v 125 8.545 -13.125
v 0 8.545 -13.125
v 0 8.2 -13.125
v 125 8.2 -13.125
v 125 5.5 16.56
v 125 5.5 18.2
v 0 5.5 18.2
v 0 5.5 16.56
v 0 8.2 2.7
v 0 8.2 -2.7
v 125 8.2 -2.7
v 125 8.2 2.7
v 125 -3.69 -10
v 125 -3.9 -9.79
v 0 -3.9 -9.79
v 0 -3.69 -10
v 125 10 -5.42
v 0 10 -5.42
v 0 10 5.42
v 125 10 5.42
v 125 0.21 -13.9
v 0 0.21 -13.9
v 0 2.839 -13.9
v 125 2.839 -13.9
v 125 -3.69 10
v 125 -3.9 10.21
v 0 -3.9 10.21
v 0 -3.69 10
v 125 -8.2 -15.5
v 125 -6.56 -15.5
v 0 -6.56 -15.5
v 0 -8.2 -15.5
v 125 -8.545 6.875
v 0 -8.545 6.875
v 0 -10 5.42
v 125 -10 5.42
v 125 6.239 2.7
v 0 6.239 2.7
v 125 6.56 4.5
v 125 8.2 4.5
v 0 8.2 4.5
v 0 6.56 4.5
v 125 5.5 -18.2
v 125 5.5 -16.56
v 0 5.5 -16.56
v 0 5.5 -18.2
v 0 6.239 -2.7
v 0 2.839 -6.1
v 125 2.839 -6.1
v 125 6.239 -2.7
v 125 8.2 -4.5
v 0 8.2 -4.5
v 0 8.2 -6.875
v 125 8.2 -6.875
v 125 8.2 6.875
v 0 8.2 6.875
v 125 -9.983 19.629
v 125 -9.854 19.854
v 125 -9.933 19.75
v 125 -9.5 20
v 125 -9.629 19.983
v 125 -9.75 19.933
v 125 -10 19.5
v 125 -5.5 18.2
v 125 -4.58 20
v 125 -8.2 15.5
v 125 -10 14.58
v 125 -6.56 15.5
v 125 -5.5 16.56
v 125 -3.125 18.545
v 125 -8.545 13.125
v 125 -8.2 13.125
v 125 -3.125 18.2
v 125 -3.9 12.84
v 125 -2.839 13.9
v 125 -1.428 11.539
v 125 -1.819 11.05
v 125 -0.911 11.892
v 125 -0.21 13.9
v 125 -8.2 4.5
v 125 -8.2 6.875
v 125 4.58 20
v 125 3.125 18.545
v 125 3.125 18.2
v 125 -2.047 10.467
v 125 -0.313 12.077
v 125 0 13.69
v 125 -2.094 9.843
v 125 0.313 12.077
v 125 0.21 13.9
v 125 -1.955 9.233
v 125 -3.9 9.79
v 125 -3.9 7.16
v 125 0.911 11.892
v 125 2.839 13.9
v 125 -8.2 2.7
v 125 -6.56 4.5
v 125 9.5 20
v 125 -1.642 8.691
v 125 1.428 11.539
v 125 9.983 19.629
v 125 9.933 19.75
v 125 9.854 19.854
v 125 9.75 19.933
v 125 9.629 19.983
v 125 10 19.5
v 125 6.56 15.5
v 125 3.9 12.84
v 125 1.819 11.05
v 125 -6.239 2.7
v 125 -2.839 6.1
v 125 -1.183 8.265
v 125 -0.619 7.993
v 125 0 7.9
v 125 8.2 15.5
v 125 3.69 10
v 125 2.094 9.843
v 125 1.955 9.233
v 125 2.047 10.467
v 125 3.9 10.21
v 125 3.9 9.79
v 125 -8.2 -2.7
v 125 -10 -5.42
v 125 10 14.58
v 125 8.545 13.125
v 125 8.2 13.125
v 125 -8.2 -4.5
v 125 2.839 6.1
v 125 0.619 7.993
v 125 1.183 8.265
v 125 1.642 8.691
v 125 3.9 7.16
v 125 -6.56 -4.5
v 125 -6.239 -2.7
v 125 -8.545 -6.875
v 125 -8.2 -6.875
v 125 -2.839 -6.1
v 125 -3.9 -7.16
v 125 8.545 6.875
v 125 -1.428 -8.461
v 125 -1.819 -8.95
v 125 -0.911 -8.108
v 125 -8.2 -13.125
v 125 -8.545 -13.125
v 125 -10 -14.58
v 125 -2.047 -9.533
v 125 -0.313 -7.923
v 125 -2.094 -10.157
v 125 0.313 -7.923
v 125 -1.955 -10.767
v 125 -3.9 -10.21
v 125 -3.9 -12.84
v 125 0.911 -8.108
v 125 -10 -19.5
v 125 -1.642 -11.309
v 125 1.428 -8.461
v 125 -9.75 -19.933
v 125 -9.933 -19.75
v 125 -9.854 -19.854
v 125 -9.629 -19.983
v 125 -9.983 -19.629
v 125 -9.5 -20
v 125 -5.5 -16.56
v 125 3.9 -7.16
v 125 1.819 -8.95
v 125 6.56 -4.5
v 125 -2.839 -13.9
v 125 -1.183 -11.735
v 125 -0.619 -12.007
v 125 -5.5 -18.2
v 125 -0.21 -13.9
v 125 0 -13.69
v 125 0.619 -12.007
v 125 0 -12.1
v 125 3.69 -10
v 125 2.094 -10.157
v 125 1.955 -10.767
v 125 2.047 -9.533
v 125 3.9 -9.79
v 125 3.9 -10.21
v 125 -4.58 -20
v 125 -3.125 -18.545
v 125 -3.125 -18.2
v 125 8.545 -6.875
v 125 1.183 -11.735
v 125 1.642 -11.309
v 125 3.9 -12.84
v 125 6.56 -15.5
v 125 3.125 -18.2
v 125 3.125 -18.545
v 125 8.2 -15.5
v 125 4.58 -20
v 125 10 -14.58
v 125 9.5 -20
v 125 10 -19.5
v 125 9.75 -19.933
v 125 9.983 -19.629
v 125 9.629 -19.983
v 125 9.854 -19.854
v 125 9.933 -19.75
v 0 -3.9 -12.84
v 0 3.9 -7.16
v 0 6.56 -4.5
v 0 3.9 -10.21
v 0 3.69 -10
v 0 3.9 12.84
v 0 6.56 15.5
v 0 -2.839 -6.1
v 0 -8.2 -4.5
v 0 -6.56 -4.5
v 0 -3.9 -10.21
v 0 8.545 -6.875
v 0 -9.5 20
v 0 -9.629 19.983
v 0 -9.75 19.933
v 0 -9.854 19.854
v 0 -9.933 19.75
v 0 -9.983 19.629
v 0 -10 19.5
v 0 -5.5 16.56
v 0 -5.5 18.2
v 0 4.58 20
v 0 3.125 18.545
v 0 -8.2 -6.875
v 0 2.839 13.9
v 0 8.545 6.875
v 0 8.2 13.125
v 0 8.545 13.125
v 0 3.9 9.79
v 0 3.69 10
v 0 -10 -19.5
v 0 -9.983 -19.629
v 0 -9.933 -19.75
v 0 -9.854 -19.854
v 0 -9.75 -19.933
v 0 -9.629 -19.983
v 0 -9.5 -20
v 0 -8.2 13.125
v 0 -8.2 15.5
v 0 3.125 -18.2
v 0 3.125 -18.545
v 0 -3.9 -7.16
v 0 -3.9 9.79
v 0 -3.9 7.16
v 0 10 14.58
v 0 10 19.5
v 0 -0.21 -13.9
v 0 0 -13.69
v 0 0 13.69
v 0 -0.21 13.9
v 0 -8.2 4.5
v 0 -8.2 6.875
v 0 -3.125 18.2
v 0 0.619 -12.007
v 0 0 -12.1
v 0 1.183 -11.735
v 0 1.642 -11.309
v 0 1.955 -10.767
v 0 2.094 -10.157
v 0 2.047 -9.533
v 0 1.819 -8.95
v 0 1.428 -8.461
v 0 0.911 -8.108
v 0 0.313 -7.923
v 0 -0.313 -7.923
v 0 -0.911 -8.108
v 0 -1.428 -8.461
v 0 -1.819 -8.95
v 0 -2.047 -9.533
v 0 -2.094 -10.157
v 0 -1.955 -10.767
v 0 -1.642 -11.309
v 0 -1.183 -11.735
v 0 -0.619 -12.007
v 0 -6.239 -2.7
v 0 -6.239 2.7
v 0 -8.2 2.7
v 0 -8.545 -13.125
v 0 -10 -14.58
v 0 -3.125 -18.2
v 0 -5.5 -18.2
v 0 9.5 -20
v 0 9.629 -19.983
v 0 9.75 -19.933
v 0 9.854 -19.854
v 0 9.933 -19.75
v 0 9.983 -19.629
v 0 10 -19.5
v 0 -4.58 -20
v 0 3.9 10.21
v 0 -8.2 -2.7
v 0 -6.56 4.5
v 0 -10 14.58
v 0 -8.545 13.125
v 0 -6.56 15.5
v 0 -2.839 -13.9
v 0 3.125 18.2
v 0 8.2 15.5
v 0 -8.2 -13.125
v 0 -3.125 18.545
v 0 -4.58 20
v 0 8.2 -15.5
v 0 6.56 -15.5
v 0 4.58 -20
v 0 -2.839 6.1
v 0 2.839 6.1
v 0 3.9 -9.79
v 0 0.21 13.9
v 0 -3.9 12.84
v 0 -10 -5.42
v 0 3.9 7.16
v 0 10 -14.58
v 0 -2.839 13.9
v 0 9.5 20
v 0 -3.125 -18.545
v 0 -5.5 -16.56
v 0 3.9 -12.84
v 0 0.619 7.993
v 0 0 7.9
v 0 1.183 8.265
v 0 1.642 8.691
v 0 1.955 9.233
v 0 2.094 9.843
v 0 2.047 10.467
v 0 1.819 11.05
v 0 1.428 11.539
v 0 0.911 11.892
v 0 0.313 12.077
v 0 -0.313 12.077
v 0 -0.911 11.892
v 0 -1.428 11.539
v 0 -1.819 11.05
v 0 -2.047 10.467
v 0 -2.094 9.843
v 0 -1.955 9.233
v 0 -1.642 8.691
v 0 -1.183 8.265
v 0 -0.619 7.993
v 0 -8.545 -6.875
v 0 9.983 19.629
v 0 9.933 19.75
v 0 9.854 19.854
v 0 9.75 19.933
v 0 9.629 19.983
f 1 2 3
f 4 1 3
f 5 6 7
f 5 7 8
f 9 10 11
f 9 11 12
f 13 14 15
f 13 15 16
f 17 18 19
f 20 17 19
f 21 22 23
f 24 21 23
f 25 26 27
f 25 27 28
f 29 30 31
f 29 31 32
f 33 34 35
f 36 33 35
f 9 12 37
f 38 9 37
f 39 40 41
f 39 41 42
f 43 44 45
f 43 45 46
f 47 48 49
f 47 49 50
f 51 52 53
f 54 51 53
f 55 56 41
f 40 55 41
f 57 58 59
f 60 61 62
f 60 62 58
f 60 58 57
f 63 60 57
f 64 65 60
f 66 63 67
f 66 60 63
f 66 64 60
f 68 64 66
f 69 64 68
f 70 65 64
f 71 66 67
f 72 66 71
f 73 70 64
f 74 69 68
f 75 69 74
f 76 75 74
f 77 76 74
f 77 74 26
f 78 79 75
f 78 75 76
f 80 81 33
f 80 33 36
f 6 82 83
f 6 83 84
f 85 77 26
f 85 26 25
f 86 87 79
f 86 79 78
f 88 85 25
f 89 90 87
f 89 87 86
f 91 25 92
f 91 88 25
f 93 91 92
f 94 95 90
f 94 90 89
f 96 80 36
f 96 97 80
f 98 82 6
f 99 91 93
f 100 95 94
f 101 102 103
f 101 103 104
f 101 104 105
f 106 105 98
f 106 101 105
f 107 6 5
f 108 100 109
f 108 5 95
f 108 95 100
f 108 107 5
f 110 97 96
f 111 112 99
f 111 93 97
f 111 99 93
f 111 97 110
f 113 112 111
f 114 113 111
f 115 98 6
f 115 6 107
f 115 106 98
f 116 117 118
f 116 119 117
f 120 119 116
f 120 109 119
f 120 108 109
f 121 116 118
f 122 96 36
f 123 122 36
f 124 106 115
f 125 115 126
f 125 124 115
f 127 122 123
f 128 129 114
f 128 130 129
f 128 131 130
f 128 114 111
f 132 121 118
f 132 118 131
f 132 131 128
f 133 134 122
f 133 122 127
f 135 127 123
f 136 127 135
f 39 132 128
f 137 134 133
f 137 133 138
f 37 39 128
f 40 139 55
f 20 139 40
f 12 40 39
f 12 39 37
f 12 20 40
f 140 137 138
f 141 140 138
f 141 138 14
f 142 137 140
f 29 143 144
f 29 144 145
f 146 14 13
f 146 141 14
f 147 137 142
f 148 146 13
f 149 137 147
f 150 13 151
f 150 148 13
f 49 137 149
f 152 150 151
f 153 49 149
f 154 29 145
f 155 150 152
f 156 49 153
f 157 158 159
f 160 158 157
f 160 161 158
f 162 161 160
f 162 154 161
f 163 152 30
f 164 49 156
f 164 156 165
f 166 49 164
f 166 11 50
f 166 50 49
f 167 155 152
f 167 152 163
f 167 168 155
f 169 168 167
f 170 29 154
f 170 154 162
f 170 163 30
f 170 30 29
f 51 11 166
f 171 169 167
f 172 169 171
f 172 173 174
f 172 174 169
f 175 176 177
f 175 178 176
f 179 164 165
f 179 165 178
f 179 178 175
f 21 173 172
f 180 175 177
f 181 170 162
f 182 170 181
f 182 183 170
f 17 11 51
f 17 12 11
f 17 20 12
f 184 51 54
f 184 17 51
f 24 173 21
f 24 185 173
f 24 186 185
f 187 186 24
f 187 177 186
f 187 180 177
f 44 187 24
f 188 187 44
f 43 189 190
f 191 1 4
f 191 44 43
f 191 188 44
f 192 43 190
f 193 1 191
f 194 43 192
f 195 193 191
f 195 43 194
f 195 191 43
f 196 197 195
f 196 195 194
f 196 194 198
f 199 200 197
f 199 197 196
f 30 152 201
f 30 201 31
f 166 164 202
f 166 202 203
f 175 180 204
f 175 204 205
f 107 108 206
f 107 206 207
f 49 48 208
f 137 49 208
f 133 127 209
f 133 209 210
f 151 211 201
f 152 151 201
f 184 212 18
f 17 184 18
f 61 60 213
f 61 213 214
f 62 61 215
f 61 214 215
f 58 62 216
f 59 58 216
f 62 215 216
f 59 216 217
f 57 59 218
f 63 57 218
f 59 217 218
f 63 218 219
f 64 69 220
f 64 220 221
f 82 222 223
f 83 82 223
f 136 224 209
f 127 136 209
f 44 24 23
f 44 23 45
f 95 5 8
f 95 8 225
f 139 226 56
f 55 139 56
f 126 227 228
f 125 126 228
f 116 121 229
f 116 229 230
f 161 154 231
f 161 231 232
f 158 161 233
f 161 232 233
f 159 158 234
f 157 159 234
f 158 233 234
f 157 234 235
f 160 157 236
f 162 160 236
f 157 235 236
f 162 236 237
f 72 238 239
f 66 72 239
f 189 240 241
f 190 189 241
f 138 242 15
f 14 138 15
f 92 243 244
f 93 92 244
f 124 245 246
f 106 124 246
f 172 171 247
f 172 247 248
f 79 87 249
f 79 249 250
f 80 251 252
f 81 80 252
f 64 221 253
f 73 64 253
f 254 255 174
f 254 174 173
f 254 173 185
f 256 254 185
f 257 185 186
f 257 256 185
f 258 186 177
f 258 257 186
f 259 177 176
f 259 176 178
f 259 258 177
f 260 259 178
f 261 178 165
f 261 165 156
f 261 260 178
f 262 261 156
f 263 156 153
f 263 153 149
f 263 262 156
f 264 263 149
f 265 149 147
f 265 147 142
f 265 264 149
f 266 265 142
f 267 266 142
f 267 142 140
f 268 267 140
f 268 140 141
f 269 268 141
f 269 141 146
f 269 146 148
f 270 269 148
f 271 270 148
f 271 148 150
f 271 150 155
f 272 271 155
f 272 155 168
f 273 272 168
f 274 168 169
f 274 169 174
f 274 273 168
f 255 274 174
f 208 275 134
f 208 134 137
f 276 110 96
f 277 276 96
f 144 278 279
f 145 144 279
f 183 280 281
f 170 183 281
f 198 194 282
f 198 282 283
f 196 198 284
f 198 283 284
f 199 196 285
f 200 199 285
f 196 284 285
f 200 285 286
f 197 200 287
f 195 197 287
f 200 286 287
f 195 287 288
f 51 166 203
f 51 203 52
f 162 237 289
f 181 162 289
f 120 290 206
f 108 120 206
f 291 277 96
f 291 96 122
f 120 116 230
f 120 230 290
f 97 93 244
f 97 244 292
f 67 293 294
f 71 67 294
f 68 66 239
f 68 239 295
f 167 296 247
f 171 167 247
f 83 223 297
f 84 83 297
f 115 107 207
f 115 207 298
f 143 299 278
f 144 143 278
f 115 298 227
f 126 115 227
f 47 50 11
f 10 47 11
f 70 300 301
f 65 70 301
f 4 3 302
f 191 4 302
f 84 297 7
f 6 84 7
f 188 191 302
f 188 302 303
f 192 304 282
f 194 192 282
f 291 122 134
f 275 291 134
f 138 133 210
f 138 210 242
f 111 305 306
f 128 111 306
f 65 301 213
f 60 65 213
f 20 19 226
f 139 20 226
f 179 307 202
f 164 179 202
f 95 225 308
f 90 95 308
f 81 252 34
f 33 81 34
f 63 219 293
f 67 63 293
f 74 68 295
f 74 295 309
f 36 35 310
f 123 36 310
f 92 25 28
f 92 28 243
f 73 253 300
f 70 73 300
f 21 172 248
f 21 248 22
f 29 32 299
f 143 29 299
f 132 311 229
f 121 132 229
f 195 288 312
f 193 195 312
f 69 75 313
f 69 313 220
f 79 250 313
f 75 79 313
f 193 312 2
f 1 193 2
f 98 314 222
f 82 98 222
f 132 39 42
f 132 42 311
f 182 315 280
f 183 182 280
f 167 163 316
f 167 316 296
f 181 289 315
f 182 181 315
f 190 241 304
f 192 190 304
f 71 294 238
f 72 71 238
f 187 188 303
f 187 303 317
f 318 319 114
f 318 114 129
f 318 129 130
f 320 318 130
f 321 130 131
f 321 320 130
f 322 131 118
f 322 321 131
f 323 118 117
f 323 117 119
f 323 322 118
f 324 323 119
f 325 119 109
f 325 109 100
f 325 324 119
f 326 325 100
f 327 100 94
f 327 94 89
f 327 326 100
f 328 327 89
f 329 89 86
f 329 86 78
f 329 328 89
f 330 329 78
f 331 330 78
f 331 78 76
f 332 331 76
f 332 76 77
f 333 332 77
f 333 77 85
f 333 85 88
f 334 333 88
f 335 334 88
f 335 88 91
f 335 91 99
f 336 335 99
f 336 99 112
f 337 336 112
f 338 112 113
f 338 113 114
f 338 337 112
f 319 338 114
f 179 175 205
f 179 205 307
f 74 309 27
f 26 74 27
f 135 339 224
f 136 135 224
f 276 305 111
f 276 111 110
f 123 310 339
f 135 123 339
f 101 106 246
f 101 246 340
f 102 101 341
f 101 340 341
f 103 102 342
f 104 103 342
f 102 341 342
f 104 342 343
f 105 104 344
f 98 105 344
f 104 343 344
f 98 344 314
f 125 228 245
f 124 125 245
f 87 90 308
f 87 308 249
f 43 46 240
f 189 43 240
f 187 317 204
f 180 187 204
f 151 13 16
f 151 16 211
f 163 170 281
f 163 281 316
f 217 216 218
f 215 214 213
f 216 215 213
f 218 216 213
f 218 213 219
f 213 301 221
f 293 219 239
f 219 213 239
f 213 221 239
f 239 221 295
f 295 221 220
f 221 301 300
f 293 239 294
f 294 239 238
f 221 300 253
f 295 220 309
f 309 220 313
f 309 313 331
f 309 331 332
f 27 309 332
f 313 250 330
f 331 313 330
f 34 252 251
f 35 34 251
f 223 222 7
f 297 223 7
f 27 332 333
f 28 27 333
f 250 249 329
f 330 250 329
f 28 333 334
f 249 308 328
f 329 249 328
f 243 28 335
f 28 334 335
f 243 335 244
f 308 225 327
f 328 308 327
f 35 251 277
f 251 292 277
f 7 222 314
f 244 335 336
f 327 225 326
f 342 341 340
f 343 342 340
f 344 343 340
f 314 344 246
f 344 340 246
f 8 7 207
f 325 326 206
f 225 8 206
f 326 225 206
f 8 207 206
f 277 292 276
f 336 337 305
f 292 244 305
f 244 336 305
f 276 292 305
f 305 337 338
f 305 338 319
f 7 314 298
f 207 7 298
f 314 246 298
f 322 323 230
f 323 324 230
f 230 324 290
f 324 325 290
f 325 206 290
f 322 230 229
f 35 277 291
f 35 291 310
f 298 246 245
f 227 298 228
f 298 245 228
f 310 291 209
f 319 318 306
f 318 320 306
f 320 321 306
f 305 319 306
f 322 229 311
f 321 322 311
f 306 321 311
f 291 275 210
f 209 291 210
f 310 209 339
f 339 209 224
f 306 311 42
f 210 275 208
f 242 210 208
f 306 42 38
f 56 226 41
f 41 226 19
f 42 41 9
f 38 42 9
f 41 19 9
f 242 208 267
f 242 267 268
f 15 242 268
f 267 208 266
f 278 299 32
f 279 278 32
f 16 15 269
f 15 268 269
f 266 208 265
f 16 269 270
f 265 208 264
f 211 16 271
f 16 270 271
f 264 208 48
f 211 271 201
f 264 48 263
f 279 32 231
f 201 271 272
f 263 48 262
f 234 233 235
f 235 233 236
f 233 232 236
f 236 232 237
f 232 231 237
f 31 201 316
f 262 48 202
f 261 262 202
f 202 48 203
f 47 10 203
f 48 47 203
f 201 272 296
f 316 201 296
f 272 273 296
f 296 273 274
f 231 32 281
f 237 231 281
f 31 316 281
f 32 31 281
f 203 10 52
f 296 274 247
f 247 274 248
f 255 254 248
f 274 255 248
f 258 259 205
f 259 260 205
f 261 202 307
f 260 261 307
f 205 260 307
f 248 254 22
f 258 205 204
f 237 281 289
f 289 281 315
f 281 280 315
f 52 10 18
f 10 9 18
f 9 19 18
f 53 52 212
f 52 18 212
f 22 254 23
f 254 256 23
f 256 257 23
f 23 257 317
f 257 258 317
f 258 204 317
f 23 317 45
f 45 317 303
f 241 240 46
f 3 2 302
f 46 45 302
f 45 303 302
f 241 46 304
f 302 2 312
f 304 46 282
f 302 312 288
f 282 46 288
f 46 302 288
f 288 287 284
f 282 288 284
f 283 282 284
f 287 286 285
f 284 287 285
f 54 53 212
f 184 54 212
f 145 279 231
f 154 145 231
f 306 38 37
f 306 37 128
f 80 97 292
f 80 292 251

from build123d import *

# Parameters (mm, degrees)
PROFILE_SKETCH_R      = 2.1
PROFILE_EXTRUDE_DEPTH = 125


with BuildPart() as part:
    # Profile Sketch → Profile Extrude (new body)
    with BuildSketch(Plane(origin=(0, 0, 0), x_dir=(0, 0, -1), z_dir=(1, 0, 0))):
        with BuildLine():
            Line((5.42, 10), (-5.42, 10))
            Line((-5.42, 10), (-6.875, 8.545))
            Line((-6.875, 8.545), (-6.875, 8.2))
            Line((-6.875, 8.2), (-4.5, 8.2))
            Line((-4.5, 8.2), (-4.5, 6.56))
            Line((-4.5, 6.56), (-7.16, 3.9))
            Line((-7.16, 3.9), (-9.79, 3.9))
            Line((-9.79, 3.9), (-10, 3.69))
            Line((-10, 3.69), (-10.21, 3.9))
            Line((-10.21, 3.9), (-12.84, 3.9))
            Line((-12.84, 3.9), (-15.5, 6.56))
            Line((-15.5, 6.56), (-15.5, 8.2))
            Line((-15.5, 8.2), (-13.125, 8.2))
            Line((-13.125, 8.2), (-13.125, 8.545))
            Line((-13.125, 8.545), (-14.58, 10))
            Line((-14.58, 10), (-19.5, 10))
            ThreePointArc((-19.5, 10), (-19.853553391, 9.853553391), (-20, 9.5))
            Line((-20, 9.5), (-20, 4.58))
            Line((-20, 4.58), (-18.545, 3.125))
            Line((-18.545, 3.125), (-18.2, 3.125))
            Line((-18.2, 3.125), (-18.2, 5.5))
            Line((-18.2, 5.5), (-16.56, 5.5))
            Line((-16.56, 5.5), (-13.9, 2.838679656))
            Line((-13.9, 2.838679656), (-13.9, 0.21))
            Line((-13.9, 0.21), (-13.69, 0))
            Line((-13.69, 0), (-13.9, -0.21))
            Line((-13.9, -0.21), (-13.9, -2.838679656))
            Line((-13.9, -2.838679656), (-16.56, -5.5))
            Line((-16.56, -5.5), (-18.2, -5.5))
            Line((-18.2, -5.5), (-18.2, -3.125))
            Line((-18.2, -3.125), (-18.545, -3.125))
            Line((-18.545, -3.125), (-20, -4.58))
            Line((-20, -4.58), (-20, -9.5))
            ThreePointArc((-20, -9.5), (-19.853553391, -9.853553391), (-19.5, -10))
            Line((-19.5, -10), (-14.58, -10))
            Line((-14.58, -10), (-13.125, -8.545))
            Line((-13.125, -8.545), (-13.125, -8.2))
            Line((-13.125, -8.2), (-15.5, -8.2))
            Line((-15.5, -8.2), (-15.5, -6.56))
            Line((-15.5, -6.56), (-12.84, -3.9))
            Line((-12.84, -3.9), (-10.21, -3.9))
            Line((-10.21, -3.9), (-10, -3.69))
            Line((-10, -3.69), (-9.79, -3.9))
            Line((-9.79, -3.9), (-7.16, -3.9))
            Line((-7.16, -3.9), (-4.5, -6.56))
            Line((-4.5, -6.56), (-4.5, -8.2))
            Line((-4.5, -8.2), (-6.875, -8.2))
            Line((-6.875, -8.2), (-6.875, -8.545))
            Line((-6.875, -8.545), (-5.42, -10))
            Line((-5.42, -10), (5.42, -10))
            Line((5.42, -10), (6.875, -8.545))
            Line((6.875, -8.545), (6.875, -8.2))
            Line((6.875, -8.2), (4.5, -8.2))
            Line((4.5, -8.2), (4.5, -6.56))
            Line((4.5, -6.56), (7.16, -3.9))
            Line((7.16, -3.9), (9.79, -3.9))
            Line((9.79, -3.9), (10, -3.69))
            Line((10, -3.69), (10.21, -3.9))
            Line((10.21, -3.9), (12.84, -3.9))
            Line((12.84, -3.9), (15.5, -6.56))
            Line((15.5, -6.56), (15.5, -8.2))
            Line((15.5, -8.2), (13.125, -8.2))
            Line((13.125, -8.2), (13.125, -8.545))
            Line((13.125, -8.545), (14.58, -10))
            Line((14.58, -10), (19.5, -10))
            ThreePointArc((19.5, -10), (19.853553391, -9.853553391), (20, -9.5))
            Line((20, -9.5), (20, -4.58))
            Line((20, -4.58), (18.545, -3.125))
            Line((18.545, -3.125), (18.2, -3.125))
            Line((18.2, -3.125), (18.2, -5.5))
            Line((18.2, -5.5), (16.56, -5.5))
            Line((16.56, -5.5), (13.9, -2.838679656))
            Line((13.9, -2.838679656), (13.9, -0.21))
            Line((13.9, -0.21), (13.69, 0))
            Line((13.69, 0), (13.9, 0.21))
            Line((13.9, 0.21), (13.9, 2.838679656))
            Line((13.9, 2.838679656), (16.56, 5.5))
            Line((16.56, 5.5), (18.2, 5.5))
            Line((18.2, 5.5), (18.2, 3.125))
            Line((18.2, 3.125), (18.545, 3.125))
            Line((18.545, 3.125), (20, 4.58))
            Line((20, 4.58), (20, 9.5))
            ThreePointArc((20, 9.5), (19.853553391, 9.853553391), (19.5, 10))
            Line((19.5, 10), (14.58, 10))
            Line((14.58, 10), (13.125, 8.545))
            Line((13.125, 8.545), (13.125, 8.2))
            Line((13.125, 8.2), (15.5, 8.2))
            Line((15.5, 8.2), (15.5, 6.56))
            Line((15.5, 6.56), (12.84, 3.9))
            Line((12.84, 3.9), (10.21, 3.9))
            Line((10.21, 3.9), (10, 3.69))
            Line((10, 3.69), (9.79, 3.9))
            Line((9.79, 3.9), (7.16, 3.9))
            Line((7.16, 3.9), (4.5, 6.56))
            Line((4.5, 6.56), (4.5, 8.2))
            Line((4.5, 8.2), (6.875, 8.2))
            Line((6.875, 8.2), (6.875, 8.545))
            Line((6.875, 8.545), (5.42, 10))
        make_face()
        with Locations((-10, 0)):
            Circle(PROFILE_SKETCH_R, mode=Mode.SUBTRACT)
        with Locations((10, 0)):
            Circle(PROFILE_SKETCH_R, mode=Mode.SUBTRACT)
        Polygon((2.7, 8.2), (-2.7, 8.2), (-2.7, 6.238679656), (-6.1, 2.838679656), (-6.1, -0.21), (-6.1, -2.838679656), (-2.7, -6.238679656), (-2.7, -8.2), (2.7, -8.2), (2.7, -6.238679656), (6.1, -2.838679656), (6.1, -0.21), (6.1, 2.838679656), (2.7, 6.238679656), align=None, mode=Mode.SUBTRACT)
    extrude(amount=PROFILE_EXTRUDE_DEPTH)


solid = part.part
